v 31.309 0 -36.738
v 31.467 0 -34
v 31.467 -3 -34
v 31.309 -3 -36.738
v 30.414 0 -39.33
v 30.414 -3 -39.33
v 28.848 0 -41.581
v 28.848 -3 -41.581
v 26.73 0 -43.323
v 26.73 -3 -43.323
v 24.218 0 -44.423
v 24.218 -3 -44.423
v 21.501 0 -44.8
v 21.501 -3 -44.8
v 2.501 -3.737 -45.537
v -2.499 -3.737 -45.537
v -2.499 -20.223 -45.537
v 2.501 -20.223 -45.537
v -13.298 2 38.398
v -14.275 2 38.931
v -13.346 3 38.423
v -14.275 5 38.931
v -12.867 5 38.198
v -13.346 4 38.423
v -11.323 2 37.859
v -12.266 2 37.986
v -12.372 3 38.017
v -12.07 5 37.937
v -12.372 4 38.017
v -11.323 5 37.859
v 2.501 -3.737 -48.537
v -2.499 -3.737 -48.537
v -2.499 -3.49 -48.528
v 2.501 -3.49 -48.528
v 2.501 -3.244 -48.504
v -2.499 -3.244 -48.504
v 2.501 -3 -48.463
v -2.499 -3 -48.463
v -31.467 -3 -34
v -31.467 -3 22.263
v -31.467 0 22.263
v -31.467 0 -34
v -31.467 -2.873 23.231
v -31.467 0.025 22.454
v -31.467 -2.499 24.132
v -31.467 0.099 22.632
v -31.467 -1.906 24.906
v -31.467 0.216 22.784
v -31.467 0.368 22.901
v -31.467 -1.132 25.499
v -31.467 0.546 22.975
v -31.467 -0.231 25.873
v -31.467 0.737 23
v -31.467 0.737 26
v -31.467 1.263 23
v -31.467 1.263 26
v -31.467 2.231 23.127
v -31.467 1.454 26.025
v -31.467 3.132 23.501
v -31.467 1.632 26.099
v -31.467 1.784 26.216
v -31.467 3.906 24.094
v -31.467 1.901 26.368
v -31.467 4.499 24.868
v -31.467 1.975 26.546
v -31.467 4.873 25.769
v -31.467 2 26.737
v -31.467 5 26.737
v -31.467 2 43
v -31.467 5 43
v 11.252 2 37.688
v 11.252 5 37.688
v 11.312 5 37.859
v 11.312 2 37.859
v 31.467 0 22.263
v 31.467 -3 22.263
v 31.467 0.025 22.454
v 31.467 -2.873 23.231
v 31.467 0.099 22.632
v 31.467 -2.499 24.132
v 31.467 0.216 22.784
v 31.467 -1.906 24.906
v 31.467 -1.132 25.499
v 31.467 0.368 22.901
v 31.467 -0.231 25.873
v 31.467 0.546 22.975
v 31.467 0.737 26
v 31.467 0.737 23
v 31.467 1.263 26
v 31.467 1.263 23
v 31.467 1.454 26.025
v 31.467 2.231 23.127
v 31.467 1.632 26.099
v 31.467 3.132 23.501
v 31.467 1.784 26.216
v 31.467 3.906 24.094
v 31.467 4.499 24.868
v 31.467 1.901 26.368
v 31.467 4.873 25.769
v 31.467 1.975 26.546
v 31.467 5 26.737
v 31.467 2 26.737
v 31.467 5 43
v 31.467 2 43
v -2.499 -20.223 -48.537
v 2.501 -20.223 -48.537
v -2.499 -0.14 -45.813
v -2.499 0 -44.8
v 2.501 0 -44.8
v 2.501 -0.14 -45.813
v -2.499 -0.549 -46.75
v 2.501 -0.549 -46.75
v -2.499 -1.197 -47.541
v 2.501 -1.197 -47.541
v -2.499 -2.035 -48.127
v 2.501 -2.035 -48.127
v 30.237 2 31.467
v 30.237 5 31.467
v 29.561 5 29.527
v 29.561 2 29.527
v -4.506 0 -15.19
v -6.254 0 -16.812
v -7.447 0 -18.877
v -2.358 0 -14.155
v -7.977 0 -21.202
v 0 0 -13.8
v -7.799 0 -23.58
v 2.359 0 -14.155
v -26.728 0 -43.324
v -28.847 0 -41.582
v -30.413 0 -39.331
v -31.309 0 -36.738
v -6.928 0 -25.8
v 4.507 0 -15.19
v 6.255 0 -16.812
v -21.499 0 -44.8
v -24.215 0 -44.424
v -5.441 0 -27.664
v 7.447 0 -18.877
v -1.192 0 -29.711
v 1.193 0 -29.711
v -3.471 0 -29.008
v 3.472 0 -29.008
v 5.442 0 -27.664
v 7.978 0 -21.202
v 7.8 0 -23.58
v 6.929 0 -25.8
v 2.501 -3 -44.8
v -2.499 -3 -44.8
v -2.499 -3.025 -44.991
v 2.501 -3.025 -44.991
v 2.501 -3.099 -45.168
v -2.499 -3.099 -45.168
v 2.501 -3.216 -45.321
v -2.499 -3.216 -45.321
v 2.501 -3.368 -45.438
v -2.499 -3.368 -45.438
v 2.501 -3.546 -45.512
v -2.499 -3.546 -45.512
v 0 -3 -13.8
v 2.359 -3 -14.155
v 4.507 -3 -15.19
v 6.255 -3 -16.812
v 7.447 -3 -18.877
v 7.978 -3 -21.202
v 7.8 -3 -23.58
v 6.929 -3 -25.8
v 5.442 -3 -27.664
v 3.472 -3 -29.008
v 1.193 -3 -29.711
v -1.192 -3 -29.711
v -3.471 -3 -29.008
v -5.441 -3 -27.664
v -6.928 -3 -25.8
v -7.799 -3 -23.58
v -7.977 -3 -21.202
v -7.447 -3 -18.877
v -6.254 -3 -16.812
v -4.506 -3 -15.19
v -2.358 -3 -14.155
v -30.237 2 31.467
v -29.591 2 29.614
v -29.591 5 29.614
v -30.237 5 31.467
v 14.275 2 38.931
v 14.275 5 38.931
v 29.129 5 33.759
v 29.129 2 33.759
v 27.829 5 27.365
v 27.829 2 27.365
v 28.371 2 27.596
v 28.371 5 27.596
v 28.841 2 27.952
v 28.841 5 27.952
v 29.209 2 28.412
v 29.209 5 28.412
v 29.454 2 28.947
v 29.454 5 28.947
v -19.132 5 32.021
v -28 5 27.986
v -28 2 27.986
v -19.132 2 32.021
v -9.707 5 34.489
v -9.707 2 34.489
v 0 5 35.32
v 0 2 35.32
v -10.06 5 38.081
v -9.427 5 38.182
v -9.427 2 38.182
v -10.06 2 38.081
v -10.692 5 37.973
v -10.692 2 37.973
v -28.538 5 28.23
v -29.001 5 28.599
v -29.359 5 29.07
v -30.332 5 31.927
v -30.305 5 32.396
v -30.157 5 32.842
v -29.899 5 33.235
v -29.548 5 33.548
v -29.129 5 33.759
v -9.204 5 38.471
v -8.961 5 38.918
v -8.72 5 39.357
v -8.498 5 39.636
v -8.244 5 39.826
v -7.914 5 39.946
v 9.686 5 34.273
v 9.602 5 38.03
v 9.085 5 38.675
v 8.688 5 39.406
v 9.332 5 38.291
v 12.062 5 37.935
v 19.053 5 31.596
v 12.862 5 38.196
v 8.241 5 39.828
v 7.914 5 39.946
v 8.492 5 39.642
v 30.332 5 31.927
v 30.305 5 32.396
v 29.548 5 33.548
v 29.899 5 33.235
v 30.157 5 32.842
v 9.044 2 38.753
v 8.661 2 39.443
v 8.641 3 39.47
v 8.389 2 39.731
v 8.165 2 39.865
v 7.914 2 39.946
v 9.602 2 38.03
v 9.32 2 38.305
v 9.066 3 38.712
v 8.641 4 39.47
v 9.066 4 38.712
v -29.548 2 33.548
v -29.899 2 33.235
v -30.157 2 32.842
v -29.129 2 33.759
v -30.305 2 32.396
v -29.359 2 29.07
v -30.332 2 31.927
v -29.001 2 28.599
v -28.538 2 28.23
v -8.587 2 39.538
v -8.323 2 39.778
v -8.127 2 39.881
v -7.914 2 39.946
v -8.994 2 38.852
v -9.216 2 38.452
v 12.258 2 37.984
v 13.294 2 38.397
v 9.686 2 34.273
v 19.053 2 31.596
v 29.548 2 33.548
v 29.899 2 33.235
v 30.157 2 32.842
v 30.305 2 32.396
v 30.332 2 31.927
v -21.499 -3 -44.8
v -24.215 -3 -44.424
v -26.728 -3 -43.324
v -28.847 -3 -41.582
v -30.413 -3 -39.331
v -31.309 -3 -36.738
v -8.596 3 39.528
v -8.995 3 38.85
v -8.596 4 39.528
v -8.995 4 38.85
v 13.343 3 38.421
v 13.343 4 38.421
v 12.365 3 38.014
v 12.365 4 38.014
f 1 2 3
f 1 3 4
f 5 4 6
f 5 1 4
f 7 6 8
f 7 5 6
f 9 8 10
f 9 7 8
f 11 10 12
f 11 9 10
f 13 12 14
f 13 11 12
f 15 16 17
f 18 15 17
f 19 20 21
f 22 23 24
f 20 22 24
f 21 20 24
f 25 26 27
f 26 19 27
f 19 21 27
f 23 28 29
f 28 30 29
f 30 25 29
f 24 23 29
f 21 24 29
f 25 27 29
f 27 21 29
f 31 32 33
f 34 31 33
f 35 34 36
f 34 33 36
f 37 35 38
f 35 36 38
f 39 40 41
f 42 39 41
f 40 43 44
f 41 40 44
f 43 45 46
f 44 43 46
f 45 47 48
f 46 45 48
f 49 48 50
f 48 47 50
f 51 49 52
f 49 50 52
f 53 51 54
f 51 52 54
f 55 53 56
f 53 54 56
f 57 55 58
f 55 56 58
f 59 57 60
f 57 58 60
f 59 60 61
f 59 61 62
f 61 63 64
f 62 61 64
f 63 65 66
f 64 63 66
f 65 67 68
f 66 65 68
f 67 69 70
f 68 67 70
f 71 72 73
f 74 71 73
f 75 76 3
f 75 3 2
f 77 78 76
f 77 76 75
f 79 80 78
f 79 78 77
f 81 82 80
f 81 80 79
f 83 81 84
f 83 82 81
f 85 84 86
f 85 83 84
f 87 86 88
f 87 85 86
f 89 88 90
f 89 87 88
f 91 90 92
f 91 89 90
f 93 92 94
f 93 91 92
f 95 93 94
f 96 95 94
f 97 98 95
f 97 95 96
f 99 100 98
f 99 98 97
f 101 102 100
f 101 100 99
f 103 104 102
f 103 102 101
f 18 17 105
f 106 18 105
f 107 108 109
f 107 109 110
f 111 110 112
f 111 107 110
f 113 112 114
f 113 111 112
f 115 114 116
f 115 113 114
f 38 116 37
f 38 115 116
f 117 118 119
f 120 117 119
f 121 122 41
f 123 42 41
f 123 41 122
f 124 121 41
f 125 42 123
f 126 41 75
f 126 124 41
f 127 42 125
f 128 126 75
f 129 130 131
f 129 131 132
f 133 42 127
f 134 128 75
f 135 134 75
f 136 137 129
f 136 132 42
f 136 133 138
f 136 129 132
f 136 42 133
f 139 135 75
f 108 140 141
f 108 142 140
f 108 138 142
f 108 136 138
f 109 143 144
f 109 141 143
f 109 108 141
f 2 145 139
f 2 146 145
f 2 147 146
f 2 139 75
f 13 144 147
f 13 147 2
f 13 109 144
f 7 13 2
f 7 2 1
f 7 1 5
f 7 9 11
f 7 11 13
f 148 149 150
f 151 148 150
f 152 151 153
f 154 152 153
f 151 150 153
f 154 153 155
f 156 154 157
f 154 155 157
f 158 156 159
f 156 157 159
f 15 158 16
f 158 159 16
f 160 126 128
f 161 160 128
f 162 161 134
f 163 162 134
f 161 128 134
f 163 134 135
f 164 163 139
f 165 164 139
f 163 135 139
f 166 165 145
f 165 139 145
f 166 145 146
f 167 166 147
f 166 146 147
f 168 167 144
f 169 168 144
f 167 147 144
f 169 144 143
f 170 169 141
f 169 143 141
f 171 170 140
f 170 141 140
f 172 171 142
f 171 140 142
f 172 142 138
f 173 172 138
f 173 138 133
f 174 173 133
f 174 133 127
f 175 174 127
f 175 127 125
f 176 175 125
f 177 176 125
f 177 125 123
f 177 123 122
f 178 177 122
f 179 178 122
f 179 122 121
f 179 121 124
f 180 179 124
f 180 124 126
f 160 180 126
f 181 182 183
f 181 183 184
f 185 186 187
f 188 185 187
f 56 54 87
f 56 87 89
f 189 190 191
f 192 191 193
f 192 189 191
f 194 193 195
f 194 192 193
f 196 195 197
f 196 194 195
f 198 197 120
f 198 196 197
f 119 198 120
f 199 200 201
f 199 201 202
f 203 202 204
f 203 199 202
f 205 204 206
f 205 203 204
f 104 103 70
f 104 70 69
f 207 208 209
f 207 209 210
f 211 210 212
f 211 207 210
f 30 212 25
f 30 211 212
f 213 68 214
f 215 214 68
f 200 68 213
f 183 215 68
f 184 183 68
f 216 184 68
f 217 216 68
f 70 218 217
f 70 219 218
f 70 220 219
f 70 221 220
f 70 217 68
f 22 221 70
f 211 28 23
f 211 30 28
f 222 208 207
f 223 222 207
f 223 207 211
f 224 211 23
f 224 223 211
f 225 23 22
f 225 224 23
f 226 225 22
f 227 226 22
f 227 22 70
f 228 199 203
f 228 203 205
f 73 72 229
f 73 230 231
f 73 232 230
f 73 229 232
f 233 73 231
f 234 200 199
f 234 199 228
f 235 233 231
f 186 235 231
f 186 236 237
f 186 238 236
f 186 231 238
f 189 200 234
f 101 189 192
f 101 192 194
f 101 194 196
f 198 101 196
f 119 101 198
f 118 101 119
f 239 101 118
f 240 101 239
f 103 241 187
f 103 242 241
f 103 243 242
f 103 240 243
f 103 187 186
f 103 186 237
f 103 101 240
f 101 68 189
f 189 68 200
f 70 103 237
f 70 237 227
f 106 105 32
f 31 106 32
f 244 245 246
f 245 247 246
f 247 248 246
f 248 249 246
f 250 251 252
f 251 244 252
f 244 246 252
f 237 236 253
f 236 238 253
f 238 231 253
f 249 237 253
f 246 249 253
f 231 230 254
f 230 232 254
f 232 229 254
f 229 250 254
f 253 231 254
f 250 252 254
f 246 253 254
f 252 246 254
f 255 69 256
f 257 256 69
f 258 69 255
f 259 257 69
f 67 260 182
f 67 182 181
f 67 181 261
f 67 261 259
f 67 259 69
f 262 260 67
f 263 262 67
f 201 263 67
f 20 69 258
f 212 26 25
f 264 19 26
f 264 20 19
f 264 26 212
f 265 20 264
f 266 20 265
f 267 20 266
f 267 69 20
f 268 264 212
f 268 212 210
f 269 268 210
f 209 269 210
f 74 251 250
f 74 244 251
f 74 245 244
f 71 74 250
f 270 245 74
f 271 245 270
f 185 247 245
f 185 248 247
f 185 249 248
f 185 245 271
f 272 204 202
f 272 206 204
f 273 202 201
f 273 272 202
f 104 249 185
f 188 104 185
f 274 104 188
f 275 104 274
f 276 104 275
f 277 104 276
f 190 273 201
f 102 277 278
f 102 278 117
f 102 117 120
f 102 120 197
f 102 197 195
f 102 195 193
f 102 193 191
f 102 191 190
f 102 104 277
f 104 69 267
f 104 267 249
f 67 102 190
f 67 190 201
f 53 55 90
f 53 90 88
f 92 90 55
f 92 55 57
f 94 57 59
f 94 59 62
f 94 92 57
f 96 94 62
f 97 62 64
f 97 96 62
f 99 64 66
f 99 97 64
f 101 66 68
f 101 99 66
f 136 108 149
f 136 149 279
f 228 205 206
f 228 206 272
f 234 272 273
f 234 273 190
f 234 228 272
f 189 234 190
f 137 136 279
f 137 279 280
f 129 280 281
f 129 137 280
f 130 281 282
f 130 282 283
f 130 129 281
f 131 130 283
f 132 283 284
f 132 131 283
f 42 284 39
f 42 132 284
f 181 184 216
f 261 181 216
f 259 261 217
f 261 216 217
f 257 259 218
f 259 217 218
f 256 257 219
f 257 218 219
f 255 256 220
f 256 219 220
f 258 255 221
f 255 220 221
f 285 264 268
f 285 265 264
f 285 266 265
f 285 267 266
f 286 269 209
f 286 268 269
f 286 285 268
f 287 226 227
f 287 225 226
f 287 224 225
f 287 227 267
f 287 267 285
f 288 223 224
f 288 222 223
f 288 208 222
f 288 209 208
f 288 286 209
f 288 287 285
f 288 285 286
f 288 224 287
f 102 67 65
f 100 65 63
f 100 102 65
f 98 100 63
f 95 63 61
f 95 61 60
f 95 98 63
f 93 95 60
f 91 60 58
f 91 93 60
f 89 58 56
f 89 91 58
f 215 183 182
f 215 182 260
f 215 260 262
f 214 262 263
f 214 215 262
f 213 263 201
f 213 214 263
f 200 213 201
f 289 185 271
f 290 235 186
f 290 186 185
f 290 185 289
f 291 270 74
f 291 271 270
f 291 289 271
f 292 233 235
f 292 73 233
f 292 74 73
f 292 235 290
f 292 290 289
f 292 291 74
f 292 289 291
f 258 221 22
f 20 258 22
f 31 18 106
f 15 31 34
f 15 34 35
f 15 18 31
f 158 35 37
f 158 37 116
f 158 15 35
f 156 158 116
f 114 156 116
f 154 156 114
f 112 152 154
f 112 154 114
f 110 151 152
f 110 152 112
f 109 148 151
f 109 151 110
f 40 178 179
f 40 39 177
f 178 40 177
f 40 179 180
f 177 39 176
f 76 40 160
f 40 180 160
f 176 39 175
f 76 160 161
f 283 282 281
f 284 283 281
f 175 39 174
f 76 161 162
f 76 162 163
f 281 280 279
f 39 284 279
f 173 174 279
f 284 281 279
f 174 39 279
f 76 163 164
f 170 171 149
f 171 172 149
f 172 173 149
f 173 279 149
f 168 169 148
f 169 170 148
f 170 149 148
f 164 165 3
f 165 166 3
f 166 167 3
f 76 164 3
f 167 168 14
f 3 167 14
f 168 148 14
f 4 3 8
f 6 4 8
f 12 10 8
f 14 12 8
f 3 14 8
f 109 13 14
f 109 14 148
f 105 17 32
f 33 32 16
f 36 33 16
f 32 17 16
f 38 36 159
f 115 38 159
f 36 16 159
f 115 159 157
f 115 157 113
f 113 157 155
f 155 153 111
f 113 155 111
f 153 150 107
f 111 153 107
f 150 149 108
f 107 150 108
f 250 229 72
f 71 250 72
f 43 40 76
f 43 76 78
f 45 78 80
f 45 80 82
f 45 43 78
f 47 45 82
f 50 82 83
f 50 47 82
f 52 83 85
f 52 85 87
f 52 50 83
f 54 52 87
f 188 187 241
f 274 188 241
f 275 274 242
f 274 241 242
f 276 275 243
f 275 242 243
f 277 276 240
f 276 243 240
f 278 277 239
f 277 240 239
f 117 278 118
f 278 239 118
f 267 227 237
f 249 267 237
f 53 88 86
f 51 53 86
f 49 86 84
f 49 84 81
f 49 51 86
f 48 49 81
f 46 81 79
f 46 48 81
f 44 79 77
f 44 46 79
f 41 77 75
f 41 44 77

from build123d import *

# Parameters (mm, degrees)
BASE_FLANGE1_DEPTH           = 3
SKETCH2_R                    = 8
CUT_EXTRUDE1_DEPTH           = 73.112420355
EDGE_FLANGE1_STRIP_W         = 13.4732
EDGE_FLANGE1_STRIP_H         = 3
EDGE_FLANGE1_STRIP_CUT_DEPTH = 62.933077126
EDGE_FLANGE1_DEPTH           = 62.933077126
EDGE_FLANGE2_STRIP_W         = 13.4732
EDGE_FLANGE2_STRIP_H         = 3
EDGE_FLANGE2_STRIP_CUT_DEPTH = 62.933077126
EDGE_FLANGE2_DEPTH           = 62.933077126
CUT_EXTRUDE14_DEPTH          = 73.492766325
CUT_EXTRUDE15_DEPTH          = 73.492766325
CUT_EXTRUDE16_DEPTH          = 73.492766325
SKETCHED_START               = -2.498589927
SKETCHED_BEND2_DEPTH         = 5
SKETCHED_BEND2_2_DEPTH       = 5


# Read off the part's stored shape, not the designer's step: Sketched Bend2
# Sheet-metal steps are written as plain solids
with BuildPart() as part:
    # Sketch1 → Base-Flange1 (new body)
    with BuildSketch(Plane(origin=(0, 0, 0), x_dir=(1, 0, 0), z_dir=(0, 1, 0))):
        with BuildLine():
            Line((2.501410073, 64.8), (-2.498589927, 64.8))
            Line((-2.498589927, 64.8), (-2.498589927, 44.8))
            Line((-2.498589927, 44.8), (-21.498589927, 44.8))
            ThreePointArc((-21.498589927, 44.8), (-28.847059156, 41.582329983), (-31.466538563, 34))
            Line((-31.466538563, 34), (-31.466538563, -26))
            Line((-31.466538563, -26), (31.466538563, -26))
            Line((31.466538563, -26), (31.466538563, 34))
            ThreePointArc((31.466538563, 34), (28.848015597, 41.581293991), (21.501410073, 44.8))
            Line((21.501410073, 44.8), (2.501410073, 44.8))
            Line((2.501410073, 44.8), (2.501410073, 64.8))
        make_face()
    extrude(amount=-BASE_FLANGE1_DEPTH)

    # Sketch2 → Cut-Extrude1 (cut, through all)
    with BuildSketch(Plane(origin=(0, 0, 0), x_dir=(1, 0, 0), z_dir=(0, 1, 0))):
        with Locations(Location((0.000474376, 21.8, 0), (0, 0, 270))):
            Circle(SKETCH2_R)
    extrude(amount=-CUT_EXTRUDE1_DEPTH, mode=Mode.SUBTRACT)

    # Edge-Flange1 strip (across the edge) → Edge-Flange1 strip cut (cut)
    with BuildSketch(Plane(origin=(-31.466538563, 0, 26), x_dir=(0, 0, -1), z_dir=(1, 0, 0))):
        with Locations((-3, -1.5)):
            Rectangle(EDGE_FLANGE1_STRIP_W, EDGE_FLANGE1_STRIP_H)
    extrude(amount=EDGE_FLANGE1_STRIP_CUT_DEPTH, mode=Mode.SUBTRACT)

    # Edge-Flange1 section (across the edge) → Edge-Flange1 (add)
    with BuildSketch(Plane(origin=(-31.466538563, 0, 26), x_dir=(0, 0, -1), z_dir=(1, 0, 0))):
        with BuildLine():
            Line((0, 0.7366), (0, 2))
            Line((0, 2), (3, 2))
            Line((3, 2), (3, 0.7366))
            ThreePointArc((3, 0.7366), (3.215745145, 0.215745145), (3.7366, 0))
            Line((3.7366, 0), (3.7366, -3))
            ThreePointArc((3.7366, -3), (1.094424801, -1.905575199), (0, 0.7366))
        make_face()
    extrude(amount=EDGE_FLANGE1_DEPTH)

    # Edge-Flange2 strip (across the edge) → Edge-Flange2 strip cut (cut)
    with BuildSketch(Plane(origin=(31.466538563, 2, 26), x_dir=(0, -1, 0), z_dir=(-1, 0, 0))):
        with Locations((-6, -1.5)):
            Rectangle(EDGE_FLANGE2_STRIP_W, EDGE_FLANGE2_STRIP_H)
    extrude(amount=EDGE_FLANGE2_STRIP_CUT_DEPTH, mode=Mode.SUBTRACT)

    # Edge-Flange2 section (across the edge) → Edge-Flange2 (add)
    with BuildSketch(Plane(origin=(31.466538563, 2, 26), x_dir=(0, -1, 0), z_dir=(-1, 0, 0))):
        with BuildLine():
            Line((-3, 0.7366), (-3, 17))
            Line((-3, 17), (0, 17))
            Line((0, 17), (0, 0.7366))
            ThreePointArc((0, 0.7366), (0.215745145, 0.215745145), (0.7366, 0))
            Line((0.7366, 0), (0.7366, -3))
            ThreePointArc((0.7366, -3), (-1.905575199, -1.905575199), (-3, 0.7366))
        make_face()
    extrude(amount=EDGE_FLANGE2_DEPTH)

    # Sketch10 → Cut-Extrude14 (cut, through all)
    with BuildSketch(Plane(origin=(0, 5, 0), x_dir=(1, 0, 0), z_dir=(0, 1, 0))):
        with BuildLine():
            ThreePointArc((-27.999525624, -27.986488127), (-14.471973254, -33.456154948), (0, -35.319999998))
            ThreePointArc((0, -35.319999998), (14.426900142, -33.134483917), (27.829351114, -27.3650614))
            ThreePointArc((27.829351114, -27.3650614), (29.363428756, -28.706266155), (29.310299494, -30.743274178))
            ThreePointArc((29.310299494, -30.743274178), (26.455644788, -32.304474337), (23.521539899, -33.71068482))
            ThreePointArc((23.521539899, -33.71068482), (12.036275705, -37.463802008), (0.039934977, -38.907751924))
            ThreePointArc((0.039934977, -38.907751924), (-11.985574487, -37.731187287), (-23.551533984, -34.234651411))
            ThreePointArc((-23.551533984, -34.234651411), (-26.516212861, -32.894099815), (-29.404911166, -31.396828455))
            ThreePointArc((-29.404911166, -31.396828455), (-29.503369191, -29.361507737), (-27.999525624, -27.986488127))
        make_face()
    extrude(amount=-CUT_EXTRUDE14_DEPTH, mode=Mode.SUBTRACT)

    # Sketch12 → Cut-Extrude15 (cut, through all)
    with BuildSketch(Plane(origin=(0, 5, 0), x_dir=(1, 0, 0), z_dir=(0, 1, 0))):
        with BuildLine():
            Line((-7.914237019, -39.945550294), (7.914237019, -39.945550294))
            add(Edge.make_bspline(
                [(7.914237019, -39.945550294), (8.930869278, -39.730893974), (8.872112241, -38.554022125), (9.602345878, -38.030110388)],
                knots=[0, 0, 0, 0, 1, 1, 1, 1], degree=3))
            Line((9.602345878, -38.030110388), (11.562836506, -37.624091619))
            Line((11.562836506, -37.624091619), (0, -37.916784011))
            Line((0, -37.916784011), (-11.562836506, -37.624091619))
            Line((-11.562836506, -37.624091619), (-9.602345878, -38.030110388))
            add(Edge.make_bspline(
                [(-7.914237019, -39.945550294), (-8.930869278, -39.730893974), (-8.872112241, -38.554022125), (-9.602345878, -38.030110388)],
                knots=[0, 0, 0, 0, 1, 1, 1, 1], degree=3))
        make_face()
    extrude(amount=-CUT_EXTRUDE15_DEPTH, mode=Mode.SUBTRACT)

    # Sketch13 → Cut-Extrude16 (cut, through all)
    with BuildSketch(Plane(origin=(0, 5, 0), x_dir=(1, 0, 0), z_dir=(0, 1, 0))):
        with BuildLine():
            Line((-29.503369191, -29.361507737), (-30.236500006, -31.46681125))
            ThreePointArc((-30.236500006, -31.46681125), (-30.1571885, -32.842186741), (-29.128569459, -33.758642374))
            Line((-29.128569459, -33.758642374), (-14.274829355, -38.931167152))
            add(Edge.make_bspline(
                [(-14.274829355, -38.931167152), (-13.356001391, -38.419364556), (-12.413528872, -37.83920993), (-11.311548038, -37.858876708)],
                knots=[0, 0, 0, 0, 1, 1, 1, 1], degree=3))
            Line((-11.311548038, -37.858876708), (-10.639965658, -35.930319464))
            Line((-10.639965658, -35.930319464), (-29.503369191, -29.361507737))
        make_face()
        with BuildLine():
            Line((10.639965658, -35.930319464), (11.311548038, -37.858876708))
            add(Edge.make_bspline(
                [(14.274829355, -38.931167152), (13.356001391, -38.419364556), (12.413528872, -37.83920993), (11.311548038, -37.858876708)],
                knots=[0, 0, 0, 0, 1, 1, 1, 1], degree=3))
            Line((14.274829355, -38.931167152), (29.128569459, -33.758642374))
            ThreePointArc((29.128569459, -33.758642374), (30.1571885, -32.842186741), (30.236500006, -31.46681125))
            Line((30.236500006, -31.46681125), (29.503369191, -29.361507737))
            Line((29.503369191, -29.361507737), (10.639965658, -35.930319464))
        make_face()
    extrude(amount=-CUT_EXTRUDE16_DEPTH, mode=Mode.SUBTRACT)

    # Sketched Bend2 outline → Sketched Bend2 (cut)
    with BuildSketch(Plane.YZ.offset(SKETCHED_START)):
        with BuildLine():
            ThreePointArc((0, -44.8), (-0.845704021, -47.167467001), (-3, -48.463277222))
            Line((-3, -48.463277222), (-3, -64.8))
            Line((-3, -64.8), (0, -64.8))
            Line((0, -64.8), (0, -44.8))
        make_face()
    extrude(amount=SKETCHED_BEND2_DEPTH, mode=Mode.SUBTRACT)

    # Sketched Bend2 2 outline → Sketched Bend2 2 (add)
    with BuildSketch(Plane.YZ.offset(SKETCHED_START)):
        with BuildLine():
            ThreePointArc((-3, -44.8), (-3.215745145, -45.320854855), (-3.7366, -45.5366))
            Line((-3.7366, -45.5366), (-20.223356935, -45.5366))
            Line((-20.223356935, -45.5366), (-20.223356935, -48.5366))
            Line((-20.223356935, -48.5366), (-3.7366, -48.5366))
            ThreePointArc((-3.7366, -48.5366), (-3.36647982, -48.518224121), (-3, -48.463277222))
            Line((-3, -48.463277222), (-3, -44.8))
        make_face()
    extrude(amount=SKETCHED_BEND2_2_DEPTH)


solid = part.part
